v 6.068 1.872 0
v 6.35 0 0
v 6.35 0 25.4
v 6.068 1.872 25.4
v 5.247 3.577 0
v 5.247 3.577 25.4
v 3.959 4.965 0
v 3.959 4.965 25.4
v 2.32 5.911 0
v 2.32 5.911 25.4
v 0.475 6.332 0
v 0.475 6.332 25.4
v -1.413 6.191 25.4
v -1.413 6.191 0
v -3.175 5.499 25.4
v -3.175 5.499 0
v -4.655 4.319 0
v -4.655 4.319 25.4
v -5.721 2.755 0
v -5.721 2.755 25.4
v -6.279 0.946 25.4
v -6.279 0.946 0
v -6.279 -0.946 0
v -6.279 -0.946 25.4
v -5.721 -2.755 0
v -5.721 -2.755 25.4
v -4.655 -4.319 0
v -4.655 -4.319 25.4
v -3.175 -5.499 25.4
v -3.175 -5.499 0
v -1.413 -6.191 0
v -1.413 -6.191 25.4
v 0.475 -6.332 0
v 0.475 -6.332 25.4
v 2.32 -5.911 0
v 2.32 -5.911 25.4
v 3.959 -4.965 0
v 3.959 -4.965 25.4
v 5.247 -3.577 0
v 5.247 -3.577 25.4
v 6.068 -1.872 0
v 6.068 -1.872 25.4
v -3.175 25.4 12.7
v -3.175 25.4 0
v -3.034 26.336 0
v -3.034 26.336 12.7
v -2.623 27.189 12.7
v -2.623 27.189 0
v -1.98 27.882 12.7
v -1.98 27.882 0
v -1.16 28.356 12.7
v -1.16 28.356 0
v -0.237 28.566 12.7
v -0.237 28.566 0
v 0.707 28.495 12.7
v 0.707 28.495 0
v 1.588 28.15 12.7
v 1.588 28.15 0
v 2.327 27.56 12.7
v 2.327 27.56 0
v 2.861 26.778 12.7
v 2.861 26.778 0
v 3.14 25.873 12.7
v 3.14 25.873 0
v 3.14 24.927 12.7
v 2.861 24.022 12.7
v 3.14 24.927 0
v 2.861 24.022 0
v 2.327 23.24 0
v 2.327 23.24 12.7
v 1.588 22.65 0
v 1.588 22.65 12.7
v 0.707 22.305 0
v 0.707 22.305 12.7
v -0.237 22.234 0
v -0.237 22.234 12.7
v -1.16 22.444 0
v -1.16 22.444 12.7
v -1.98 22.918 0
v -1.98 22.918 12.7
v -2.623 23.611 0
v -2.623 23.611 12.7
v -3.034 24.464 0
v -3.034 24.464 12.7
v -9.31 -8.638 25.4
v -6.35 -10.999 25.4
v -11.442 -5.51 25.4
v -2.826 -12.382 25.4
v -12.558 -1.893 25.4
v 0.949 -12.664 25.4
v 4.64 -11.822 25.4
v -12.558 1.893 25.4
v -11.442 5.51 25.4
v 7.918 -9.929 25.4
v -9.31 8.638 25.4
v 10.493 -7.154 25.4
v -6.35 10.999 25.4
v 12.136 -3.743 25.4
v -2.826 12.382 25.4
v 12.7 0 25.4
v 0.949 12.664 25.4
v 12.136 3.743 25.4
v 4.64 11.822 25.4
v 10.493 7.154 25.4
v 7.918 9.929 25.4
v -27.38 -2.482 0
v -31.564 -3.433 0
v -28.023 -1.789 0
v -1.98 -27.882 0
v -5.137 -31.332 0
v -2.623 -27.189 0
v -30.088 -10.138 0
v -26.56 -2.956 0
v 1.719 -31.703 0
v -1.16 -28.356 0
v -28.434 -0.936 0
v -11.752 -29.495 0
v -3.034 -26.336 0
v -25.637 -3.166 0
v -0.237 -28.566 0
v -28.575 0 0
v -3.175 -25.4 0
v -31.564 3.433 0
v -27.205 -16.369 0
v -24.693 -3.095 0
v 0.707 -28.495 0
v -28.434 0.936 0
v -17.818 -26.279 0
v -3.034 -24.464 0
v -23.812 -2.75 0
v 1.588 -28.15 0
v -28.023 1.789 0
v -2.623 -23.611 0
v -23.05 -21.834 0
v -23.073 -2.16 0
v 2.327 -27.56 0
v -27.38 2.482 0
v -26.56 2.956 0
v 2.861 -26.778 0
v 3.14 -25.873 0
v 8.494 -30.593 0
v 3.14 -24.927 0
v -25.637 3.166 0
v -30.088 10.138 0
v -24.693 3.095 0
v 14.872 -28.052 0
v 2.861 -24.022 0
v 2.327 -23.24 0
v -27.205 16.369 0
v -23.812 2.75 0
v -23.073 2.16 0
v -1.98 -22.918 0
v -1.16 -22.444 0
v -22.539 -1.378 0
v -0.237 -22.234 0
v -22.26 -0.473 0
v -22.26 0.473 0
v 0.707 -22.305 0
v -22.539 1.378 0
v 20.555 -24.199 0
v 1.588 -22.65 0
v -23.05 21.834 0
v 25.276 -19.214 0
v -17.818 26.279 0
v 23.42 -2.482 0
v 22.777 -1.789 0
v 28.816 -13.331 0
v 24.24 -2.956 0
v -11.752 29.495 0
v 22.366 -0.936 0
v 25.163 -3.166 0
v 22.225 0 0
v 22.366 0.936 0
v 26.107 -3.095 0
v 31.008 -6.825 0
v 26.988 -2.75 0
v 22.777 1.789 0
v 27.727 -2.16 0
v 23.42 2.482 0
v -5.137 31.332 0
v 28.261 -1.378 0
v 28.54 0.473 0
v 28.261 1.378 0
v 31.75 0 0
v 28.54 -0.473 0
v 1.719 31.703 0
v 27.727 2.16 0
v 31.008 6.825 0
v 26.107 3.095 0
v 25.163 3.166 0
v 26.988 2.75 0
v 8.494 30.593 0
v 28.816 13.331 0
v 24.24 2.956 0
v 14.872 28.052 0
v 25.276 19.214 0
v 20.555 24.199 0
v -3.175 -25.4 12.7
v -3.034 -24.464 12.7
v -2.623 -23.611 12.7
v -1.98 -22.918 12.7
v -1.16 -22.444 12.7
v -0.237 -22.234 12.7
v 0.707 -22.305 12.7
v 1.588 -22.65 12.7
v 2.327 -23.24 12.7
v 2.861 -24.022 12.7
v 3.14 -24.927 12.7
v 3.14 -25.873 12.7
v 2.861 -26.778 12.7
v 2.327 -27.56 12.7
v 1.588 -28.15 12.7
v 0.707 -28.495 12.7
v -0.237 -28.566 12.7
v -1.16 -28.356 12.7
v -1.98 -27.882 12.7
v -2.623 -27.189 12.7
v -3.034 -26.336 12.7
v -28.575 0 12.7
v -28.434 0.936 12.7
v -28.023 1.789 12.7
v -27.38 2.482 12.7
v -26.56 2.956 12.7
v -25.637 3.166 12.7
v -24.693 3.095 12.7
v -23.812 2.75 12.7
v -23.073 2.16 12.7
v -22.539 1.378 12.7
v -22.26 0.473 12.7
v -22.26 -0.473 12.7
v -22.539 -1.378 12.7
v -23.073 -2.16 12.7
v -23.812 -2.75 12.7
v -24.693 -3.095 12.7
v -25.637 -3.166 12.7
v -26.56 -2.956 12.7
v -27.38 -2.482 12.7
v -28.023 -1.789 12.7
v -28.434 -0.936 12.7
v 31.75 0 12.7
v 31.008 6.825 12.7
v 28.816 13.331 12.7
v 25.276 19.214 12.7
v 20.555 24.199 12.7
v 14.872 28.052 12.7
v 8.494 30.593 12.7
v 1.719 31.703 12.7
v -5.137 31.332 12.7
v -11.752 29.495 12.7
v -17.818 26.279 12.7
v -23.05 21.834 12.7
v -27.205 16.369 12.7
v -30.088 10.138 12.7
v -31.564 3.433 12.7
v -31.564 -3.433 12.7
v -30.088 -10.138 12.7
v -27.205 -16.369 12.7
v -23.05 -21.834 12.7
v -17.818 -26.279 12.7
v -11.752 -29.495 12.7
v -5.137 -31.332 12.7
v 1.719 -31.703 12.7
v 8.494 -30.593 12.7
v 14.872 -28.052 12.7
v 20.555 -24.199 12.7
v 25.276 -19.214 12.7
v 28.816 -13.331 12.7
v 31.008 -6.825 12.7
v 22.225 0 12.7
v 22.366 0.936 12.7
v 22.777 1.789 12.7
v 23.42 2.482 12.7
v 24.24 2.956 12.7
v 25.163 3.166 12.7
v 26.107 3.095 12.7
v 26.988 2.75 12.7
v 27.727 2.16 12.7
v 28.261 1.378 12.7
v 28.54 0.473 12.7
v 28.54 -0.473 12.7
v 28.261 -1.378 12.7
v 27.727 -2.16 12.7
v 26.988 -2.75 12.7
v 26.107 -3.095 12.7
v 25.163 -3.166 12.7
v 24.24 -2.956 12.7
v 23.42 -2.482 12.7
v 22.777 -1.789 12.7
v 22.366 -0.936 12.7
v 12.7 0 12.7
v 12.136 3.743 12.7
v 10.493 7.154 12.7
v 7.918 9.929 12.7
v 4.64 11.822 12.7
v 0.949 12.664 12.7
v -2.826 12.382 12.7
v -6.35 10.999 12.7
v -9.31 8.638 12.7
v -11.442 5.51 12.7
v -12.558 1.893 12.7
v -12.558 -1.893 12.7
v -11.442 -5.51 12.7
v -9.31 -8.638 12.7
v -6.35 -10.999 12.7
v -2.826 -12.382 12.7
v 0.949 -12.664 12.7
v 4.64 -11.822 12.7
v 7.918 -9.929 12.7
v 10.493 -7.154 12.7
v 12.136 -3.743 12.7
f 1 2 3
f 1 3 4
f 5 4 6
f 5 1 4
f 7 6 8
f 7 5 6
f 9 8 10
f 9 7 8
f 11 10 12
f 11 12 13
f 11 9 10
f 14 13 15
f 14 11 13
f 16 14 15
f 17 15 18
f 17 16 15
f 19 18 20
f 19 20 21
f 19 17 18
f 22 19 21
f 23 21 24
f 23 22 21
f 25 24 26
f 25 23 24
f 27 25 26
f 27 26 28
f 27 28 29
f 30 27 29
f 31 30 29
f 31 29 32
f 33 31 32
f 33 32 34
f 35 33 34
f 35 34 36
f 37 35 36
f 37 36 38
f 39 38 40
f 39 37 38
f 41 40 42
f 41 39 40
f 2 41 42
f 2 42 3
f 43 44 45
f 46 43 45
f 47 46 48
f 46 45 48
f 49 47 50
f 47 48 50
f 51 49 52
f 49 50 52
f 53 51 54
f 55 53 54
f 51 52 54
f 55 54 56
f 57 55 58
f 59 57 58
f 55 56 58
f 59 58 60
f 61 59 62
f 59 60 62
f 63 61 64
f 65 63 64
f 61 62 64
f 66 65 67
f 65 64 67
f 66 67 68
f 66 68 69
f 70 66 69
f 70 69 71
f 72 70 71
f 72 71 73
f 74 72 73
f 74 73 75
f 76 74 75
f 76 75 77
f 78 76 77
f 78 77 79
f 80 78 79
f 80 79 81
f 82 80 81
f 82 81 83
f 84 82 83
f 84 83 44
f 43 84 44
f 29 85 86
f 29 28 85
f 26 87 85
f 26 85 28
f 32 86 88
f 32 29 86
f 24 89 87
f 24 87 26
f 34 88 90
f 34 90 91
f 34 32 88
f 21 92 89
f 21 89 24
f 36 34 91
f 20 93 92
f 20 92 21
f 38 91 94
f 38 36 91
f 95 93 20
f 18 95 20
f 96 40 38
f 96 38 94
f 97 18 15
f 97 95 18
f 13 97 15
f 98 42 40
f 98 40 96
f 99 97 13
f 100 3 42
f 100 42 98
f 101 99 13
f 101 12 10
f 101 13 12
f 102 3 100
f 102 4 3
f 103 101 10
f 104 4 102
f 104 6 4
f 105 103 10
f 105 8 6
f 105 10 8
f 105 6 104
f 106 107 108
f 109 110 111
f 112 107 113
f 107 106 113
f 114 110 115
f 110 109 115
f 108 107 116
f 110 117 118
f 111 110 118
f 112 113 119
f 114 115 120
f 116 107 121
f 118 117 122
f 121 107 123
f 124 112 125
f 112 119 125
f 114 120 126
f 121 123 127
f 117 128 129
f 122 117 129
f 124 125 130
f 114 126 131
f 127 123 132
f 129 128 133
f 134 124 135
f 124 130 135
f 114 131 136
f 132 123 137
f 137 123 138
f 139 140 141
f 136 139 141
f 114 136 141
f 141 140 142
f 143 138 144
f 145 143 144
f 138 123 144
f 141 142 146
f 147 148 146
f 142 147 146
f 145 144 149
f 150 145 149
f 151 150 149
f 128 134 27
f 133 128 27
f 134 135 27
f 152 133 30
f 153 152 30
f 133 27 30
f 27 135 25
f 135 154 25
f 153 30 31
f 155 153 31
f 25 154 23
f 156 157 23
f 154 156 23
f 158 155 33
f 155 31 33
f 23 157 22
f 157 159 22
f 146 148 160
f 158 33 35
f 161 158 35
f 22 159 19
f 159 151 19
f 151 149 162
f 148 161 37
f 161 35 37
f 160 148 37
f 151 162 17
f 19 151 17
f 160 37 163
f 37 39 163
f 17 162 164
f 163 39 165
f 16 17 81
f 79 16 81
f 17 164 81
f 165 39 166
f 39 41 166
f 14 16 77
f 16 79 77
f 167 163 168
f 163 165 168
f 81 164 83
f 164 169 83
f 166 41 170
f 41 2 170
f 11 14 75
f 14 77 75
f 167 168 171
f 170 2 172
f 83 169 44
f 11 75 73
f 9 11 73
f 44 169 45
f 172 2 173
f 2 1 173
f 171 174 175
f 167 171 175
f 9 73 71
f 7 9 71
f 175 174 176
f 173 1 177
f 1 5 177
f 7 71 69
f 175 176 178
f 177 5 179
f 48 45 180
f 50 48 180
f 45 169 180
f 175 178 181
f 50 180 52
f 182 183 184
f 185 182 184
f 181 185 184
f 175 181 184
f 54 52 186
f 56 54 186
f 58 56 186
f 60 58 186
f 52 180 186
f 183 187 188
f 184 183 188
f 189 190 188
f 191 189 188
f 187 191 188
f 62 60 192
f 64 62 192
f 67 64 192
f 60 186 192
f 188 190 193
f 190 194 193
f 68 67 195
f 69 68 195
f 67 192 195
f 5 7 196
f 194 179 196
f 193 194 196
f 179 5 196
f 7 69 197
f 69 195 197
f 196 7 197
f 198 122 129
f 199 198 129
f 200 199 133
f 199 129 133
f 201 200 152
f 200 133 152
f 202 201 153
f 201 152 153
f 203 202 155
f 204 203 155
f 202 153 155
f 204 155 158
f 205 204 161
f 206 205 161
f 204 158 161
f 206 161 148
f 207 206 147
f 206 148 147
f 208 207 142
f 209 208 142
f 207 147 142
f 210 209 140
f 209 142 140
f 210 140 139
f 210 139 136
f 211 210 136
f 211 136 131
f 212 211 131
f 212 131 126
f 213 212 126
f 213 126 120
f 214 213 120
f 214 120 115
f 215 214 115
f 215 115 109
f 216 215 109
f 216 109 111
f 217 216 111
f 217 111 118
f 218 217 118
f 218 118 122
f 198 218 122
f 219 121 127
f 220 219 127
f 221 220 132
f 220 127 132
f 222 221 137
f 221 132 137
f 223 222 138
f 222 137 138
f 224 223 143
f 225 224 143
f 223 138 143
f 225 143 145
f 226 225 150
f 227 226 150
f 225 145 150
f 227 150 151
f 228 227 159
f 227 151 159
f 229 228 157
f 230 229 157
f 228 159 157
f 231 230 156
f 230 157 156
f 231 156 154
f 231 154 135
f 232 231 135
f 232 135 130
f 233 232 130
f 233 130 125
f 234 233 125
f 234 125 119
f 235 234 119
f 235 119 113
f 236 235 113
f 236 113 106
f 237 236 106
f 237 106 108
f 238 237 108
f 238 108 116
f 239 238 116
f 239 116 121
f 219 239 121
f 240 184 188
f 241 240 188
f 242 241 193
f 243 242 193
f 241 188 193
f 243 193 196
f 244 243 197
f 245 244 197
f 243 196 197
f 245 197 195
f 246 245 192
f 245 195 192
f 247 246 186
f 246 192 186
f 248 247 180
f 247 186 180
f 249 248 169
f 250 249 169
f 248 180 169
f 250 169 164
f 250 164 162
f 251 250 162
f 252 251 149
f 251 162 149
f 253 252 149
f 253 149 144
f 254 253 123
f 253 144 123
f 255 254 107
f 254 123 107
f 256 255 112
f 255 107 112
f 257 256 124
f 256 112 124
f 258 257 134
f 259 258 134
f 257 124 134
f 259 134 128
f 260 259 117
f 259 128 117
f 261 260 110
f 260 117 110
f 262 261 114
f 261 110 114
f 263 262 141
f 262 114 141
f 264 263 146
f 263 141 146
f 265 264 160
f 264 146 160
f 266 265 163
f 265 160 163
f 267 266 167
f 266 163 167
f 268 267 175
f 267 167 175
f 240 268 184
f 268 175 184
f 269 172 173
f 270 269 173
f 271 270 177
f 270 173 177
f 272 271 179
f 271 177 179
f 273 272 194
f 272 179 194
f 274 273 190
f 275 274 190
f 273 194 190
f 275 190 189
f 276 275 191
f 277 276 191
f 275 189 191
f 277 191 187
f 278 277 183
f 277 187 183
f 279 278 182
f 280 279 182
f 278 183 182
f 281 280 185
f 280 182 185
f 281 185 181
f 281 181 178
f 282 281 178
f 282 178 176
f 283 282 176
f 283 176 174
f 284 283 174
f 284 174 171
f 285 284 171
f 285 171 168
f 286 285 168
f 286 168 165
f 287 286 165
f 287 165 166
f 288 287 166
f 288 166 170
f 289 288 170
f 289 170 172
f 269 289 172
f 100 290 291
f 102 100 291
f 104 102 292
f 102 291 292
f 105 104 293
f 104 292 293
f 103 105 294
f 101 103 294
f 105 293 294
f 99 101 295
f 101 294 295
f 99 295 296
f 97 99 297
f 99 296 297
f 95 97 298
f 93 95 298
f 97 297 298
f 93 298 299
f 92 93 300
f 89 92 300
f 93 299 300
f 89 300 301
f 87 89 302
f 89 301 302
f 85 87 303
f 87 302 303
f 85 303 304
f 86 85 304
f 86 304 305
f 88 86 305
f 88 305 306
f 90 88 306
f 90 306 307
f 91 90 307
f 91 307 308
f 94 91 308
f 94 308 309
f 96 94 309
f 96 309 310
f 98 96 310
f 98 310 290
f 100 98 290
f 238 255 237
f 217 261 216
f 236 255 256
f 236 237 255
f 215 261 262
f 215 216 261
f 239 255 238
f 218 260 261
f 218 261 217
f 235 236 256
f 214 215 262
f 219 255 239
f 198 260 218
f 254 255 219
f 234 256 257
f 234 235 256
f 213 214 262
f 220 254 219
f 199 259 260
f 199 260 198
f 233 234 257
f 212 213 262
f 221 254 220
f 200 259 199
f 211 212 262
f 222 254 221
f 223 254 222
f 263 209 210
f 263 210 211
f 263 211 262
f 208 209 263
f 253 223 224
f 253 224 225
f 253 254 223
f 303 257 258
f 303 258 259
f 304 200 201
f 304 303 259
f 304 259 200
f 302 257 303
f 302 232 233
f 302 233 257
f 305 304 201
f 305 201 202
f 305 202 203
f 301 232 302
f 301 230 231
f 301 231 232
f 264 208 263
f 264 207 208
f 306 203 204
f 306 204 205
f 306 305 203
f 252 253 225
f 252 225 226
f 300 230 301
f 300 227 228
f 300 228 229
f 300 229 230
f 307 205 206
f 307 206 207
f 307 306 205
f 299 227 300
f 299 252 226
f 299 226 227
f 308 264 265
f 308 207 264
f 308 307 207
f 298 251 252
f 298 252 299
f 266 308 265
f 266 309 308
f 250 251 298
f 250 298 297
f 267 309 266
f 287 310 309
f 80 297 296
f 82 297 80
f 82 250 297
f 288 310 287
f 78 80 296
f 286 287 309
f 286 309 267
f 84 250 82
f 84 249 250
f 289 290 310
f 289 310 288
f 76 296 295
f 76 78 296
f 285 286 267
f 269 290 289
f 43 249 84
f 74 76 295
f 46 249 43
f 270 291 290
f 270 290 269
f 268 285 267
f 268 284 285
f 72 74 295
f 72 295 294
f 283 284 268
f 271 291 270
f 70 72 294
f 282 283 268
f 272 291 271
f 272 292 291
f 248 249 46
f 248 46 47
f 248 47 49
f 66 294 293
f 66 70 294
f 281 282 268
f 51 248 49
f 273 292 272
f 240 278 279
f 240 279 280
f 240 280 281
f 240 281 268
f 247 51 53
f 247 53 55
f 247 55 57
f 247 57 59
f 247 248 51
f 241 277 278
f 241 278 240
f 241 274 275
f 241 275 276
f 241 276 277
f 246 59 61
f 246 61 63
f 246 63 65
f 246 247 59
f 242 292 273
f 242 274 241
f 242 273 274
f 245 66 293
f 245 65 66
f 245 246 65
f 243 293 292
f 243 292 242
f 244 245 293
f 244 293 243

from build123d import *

# Parameters (mm, degrees)
F0_R     = 31.75
F0_R_2   = 12.7
F1_DEPTH = 12.7
F0_R_3   = 6.35
F2_DEPTH = 25.4
F4_D     = 6.35


with BuildPart() as f1:
    # F0 (on Top) → F1 (new body)
    with BuildSketch(Plane.XY):
        Circle(F0_R)
        Circle(F0_R_2, mode=Mode.SUBTRACT)
    extrude(amount=F1_DEPTH)

    # F0 (on Top) → F2 (join)
    with BuildSketch(Plane.XY):
        Circle(F0_R_2)
        Circle(F0_R_3, mode=Mode.SUBTRACT)
    extrude(amount=F2_DEPTH)

    # F4 (through all)
    with Locations(Plane.XY.offset(12.7)):
        with Locations((0, 25.4), (25.4, 0), (0, -25.4), (-25.4, 0)):
            Hole(F4_D / 2)


solid = f1.part
